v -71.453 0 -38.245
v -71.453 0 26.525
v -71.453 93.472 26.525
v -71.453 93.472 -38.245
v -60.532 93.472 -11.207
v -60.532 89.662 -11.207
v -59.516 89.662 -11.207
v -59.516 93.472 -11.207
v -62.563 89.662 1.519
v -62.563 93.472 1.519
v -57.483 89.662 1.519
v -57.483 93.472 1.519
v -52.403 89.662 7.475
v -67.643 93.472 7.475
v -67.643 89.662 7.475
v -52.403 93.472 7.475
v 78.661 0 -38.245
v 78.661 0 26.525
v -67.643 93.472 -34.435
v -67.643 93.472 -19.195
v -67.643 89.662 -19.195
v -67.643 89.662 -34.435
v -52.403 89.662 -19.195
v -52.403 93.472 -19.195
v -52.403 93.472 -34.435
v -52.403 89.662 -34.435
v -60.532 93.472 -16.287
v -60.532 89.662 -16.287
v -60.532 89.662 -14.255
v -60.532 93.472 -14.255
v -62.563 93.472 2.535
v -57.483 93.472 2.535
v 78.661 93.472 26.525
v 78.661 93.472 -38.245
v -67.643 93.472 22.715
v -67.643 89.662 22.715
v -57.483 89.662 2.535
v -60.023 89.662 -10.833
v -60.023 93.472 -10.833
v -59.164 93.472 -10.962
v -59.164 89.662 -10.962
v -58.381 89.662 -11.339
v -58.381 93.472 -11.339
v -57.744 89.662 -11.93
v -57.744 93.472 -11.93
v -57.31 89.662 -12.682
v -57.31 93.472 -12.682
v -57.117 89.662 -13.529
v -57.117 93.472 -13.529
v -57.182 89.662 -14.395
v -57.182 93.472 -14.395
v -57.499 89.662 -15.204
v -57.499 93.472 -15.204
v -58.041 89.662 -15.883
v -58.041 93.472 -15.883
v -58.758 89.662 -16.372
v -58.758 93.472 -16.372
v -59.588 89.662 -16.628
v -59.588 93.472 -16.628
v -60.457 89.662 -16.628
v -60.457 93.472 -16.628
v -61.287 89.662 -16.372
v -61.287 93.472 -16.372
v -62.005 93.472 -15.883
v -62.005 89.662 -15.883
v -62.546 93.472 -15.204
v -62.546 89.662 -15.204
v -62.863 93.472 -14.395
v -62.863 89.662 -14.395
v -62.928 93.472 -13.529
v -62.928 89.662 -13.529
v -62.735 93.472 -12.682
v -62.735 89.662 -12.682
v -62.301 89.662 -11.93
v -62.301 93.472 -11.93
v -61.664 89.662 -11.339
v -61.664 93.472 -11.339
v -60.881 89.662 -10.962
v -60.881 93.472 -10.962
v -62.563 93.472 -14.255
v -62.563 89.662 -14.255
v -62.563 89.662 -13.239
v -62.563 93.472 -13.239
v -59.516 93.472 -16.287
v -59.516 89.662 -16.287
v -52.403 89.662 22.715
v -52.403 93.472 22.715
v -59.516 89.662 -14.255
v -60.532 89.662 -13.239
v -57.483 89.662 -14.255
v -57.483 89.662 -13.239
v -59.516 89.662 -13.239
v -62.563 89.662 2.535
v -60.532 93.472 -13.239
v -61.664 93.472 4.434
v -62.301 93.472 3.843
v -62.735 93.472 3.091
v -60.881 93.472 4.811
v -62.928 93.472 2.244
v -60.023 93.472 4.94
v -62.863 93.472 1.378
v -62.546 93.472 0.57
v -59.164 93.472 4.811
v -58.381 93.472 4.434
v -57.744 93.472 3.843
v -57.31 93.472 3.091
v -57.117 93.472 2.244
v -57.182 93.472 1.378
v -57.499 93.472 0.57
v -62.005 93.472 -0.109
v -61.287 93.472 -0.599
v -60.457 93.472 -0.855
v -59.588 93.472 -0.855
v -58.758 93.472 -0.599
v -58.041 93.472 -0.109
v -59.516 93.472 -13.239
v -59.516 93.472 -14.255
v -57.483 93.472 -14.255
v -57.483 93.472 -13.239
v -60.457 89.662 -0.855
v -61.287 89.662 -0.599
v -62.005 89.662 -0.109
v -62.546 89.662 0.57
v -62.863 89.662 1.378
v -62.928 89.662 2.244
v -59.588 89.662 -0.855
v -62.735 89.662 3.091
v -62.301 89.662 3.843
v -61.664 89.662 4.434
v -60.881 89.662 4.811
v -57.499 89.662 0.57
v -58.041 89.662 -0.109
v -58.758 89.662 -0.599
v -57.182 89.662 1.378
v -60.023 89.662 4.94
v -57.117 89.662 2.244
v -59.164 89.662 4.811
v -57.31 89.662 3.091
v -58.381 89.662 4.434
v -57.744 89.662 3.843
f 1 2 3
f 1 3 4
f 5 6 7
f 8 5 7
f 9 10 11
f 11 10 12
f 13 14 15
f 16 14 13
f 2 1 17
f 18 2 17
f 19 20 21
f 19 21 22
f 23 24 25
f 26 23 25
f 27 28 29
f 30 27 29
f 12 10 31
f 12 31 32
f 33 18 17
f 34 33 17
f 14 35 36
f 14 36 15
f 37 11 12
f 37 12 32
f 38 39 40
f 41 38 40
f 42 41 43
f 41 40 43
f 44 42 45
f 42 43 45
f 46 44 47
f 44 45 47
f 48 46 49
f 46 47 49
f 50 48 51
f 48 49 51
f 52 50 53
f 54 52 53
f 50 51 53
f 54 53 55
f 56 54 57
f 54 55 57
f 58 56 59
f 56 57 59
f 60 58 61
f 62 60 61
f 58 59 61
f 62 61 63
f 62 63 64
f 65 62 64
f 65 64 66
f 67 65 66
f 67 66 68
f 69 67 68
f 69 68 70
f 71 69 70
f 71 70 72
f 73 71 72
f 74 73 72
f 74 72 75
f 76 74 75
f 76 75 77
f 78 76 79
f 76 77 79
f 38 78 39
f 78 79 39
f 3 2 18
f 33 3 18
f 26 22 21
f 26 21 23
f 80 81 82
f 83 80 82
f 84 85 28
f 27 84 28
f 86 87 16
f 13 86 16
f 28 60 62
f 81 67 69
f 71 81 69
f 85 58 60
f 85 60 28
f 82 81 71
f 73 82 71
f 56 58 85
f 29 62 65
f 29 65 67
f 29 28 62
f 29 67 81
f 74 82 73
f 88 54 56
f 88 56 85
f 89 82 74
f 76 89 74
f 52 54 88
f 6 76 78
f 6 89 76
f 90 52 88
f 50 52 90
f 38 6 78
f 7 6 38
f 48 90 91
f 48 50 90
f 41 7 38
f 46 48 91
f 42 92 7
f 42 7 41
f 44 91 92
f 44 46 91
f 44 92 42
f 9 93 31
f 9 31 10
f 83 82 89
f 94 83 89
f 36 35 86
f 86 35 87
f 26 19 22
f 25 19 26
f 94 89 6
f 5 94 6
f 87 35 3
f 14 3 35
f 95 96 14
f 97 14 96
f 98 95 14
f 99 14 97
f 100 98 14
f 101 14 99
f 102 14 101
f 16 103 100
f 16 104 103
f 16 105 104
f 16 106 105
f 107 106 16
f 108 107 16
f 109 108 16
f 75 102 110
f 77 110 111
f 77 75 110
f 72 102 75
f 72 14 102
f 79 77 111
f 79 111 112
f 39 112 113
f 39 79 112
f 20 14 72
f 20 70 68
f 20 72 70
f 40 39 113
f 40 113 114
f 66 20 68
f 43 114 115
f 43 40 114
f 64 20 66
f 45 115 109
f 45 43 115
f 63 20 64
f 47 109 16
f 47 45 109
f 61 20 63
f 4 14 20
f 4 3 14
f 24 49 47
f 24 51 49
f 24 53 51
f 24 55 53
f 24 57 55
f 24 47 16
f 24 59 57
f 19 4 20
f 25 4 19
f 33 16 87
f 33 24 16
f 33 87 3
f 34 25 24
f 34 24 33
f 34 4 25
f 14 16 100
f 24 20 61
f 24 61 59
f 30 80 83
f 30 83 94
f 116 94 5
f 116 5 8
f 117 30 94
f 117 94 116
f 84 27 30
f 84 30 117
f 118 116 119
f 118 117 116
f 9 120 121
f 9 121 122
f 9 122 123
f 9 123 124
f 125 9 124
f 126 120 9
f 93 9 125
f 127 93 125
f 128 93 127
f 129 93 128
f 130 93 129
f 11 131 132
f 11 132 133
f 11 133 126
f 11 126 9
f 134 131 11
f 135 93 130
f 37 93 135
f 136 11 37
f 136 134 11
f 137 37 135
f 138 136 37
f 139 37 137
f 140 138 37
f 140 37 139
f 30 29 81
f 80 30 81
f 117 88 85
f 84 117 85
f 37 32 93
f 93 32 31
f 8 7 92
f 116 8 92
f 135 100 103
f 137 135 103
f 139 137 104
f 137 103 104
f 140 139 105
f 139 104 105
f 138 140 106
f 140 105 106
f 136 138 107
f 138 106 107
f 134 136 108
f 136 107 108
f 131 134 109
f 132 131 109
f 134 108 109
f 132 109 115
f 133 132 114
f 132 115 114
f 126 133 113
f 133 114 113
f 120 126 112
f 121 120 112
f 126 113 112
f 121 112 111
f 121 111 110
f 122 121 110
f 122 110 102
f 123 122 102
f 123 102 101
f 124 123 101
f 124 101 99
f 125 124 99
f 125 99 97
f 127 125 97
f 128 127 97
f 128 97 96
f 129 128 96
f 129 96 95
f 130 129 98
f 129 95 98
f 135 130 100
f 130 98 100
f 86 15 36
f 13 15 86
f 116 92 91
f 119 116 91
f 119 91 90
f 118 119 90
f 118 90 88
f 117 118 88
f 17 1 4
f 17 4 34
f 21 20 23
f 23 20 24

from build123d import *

# Parameters (mm, degrees)
SKETCH1_W           = 150.114
SKETCH1_H           = 64.77
BOSS_EXTRUDE1_DEPTH = 93.472
SKETCH2_R           = 2.91386686
SKETCH2_W           = 15.24
SKETCH2_H           = 15.24
CUT_EXTRUDE1_DEPTH  = 3.81


with BuildPart() as part:
    # Sketch1 → Boss-Extrude1 (new body)
    with BuildSketch(Plane(origin=(0, 0, 0), x_dir=(1, 0, 0), z_dir=(0, 1, 0))):
        with Locations((3.604380952, 5.860142857)):
            Rectangle(SKETCH1_W, SKETCH1_H)
    extrude(amount=BOSS_EXTRUDE1_DEPTH)

    # Sketch2 → Cut-Extrude1 (cut)
    # profile 1 of 4: a face of its own
    with BuildSketch(Plane(origin=(0, 93.472, 0), x_dir=(1, 0, 0), z_dir=(0, 1, 0))):
        with Locations(Location((-60.022619048, -2.026557143, 0), (0, 0, 270))):
            Circle(SKETCH2_R)
        Polygon((-60.022619048, -1.518557143), (-57.482619048, -1.518557143), (-57.482619048, -2.534557143), (-62.562619048, -2.534557143), (-62.562619048, -1.518557143), align=None, mode=Mode.SUBTRACT)
    # profile 2 of 4: a face of its own
    with BuildSketch(Plane(origin=(0, 93.472, 0), x_dir=(1, 0, 0), z_dir=(0, 1, 0))):
        with Locations(Location((-60.022619048, 13.746842857, 0), (0, 0, 270))):
            Circle(SKETCH2_R)
        Polygon((-57.482619048, 13.238842857), (-57.482619048, 14.254842857), (-59.515974161, 14.254842857), (-59.515974161, 16.286842857), (-60.531974161, 16.286842857), (-60.531974161, 14.254842857), (-62.562619048, 14.254842857), (-62.562619048, 13.238842857), (-60.531974161, 13.238842857), (-60.531974161, 11.206842857), (-59.515974161, 11.206842857), (-59.515974161, 13.238842857), align=None, mode=Mode.SUBTRACT)
    # profile 3 of 4: a face of its own
    with BuildSketch(Plane(origin=(0, 93.472, 0), x_dir=(1, 0, 0), z_dir=(0, 1, 0))):
        with Locations((-60.022619048, -15.094857143)):
            Rectangle(SKETCH2_W, SKETCH2_H)
    # profile 4 of 4: a face of its own
    with BuildSketch(Plane(origin=(0, 93.472, 0), x_dir=(1, 0, 0), z_dir=(0, 1, 0))):
        with Locations((-60.022619048, 26.815142857)):
            Rectangle(SKETCH2_W, SKETCH2_H)
    extrude(amount=-CUT_EXTRUDE1_DEPTH, mode=Mode.SUBTRACT)


solid = part.part
